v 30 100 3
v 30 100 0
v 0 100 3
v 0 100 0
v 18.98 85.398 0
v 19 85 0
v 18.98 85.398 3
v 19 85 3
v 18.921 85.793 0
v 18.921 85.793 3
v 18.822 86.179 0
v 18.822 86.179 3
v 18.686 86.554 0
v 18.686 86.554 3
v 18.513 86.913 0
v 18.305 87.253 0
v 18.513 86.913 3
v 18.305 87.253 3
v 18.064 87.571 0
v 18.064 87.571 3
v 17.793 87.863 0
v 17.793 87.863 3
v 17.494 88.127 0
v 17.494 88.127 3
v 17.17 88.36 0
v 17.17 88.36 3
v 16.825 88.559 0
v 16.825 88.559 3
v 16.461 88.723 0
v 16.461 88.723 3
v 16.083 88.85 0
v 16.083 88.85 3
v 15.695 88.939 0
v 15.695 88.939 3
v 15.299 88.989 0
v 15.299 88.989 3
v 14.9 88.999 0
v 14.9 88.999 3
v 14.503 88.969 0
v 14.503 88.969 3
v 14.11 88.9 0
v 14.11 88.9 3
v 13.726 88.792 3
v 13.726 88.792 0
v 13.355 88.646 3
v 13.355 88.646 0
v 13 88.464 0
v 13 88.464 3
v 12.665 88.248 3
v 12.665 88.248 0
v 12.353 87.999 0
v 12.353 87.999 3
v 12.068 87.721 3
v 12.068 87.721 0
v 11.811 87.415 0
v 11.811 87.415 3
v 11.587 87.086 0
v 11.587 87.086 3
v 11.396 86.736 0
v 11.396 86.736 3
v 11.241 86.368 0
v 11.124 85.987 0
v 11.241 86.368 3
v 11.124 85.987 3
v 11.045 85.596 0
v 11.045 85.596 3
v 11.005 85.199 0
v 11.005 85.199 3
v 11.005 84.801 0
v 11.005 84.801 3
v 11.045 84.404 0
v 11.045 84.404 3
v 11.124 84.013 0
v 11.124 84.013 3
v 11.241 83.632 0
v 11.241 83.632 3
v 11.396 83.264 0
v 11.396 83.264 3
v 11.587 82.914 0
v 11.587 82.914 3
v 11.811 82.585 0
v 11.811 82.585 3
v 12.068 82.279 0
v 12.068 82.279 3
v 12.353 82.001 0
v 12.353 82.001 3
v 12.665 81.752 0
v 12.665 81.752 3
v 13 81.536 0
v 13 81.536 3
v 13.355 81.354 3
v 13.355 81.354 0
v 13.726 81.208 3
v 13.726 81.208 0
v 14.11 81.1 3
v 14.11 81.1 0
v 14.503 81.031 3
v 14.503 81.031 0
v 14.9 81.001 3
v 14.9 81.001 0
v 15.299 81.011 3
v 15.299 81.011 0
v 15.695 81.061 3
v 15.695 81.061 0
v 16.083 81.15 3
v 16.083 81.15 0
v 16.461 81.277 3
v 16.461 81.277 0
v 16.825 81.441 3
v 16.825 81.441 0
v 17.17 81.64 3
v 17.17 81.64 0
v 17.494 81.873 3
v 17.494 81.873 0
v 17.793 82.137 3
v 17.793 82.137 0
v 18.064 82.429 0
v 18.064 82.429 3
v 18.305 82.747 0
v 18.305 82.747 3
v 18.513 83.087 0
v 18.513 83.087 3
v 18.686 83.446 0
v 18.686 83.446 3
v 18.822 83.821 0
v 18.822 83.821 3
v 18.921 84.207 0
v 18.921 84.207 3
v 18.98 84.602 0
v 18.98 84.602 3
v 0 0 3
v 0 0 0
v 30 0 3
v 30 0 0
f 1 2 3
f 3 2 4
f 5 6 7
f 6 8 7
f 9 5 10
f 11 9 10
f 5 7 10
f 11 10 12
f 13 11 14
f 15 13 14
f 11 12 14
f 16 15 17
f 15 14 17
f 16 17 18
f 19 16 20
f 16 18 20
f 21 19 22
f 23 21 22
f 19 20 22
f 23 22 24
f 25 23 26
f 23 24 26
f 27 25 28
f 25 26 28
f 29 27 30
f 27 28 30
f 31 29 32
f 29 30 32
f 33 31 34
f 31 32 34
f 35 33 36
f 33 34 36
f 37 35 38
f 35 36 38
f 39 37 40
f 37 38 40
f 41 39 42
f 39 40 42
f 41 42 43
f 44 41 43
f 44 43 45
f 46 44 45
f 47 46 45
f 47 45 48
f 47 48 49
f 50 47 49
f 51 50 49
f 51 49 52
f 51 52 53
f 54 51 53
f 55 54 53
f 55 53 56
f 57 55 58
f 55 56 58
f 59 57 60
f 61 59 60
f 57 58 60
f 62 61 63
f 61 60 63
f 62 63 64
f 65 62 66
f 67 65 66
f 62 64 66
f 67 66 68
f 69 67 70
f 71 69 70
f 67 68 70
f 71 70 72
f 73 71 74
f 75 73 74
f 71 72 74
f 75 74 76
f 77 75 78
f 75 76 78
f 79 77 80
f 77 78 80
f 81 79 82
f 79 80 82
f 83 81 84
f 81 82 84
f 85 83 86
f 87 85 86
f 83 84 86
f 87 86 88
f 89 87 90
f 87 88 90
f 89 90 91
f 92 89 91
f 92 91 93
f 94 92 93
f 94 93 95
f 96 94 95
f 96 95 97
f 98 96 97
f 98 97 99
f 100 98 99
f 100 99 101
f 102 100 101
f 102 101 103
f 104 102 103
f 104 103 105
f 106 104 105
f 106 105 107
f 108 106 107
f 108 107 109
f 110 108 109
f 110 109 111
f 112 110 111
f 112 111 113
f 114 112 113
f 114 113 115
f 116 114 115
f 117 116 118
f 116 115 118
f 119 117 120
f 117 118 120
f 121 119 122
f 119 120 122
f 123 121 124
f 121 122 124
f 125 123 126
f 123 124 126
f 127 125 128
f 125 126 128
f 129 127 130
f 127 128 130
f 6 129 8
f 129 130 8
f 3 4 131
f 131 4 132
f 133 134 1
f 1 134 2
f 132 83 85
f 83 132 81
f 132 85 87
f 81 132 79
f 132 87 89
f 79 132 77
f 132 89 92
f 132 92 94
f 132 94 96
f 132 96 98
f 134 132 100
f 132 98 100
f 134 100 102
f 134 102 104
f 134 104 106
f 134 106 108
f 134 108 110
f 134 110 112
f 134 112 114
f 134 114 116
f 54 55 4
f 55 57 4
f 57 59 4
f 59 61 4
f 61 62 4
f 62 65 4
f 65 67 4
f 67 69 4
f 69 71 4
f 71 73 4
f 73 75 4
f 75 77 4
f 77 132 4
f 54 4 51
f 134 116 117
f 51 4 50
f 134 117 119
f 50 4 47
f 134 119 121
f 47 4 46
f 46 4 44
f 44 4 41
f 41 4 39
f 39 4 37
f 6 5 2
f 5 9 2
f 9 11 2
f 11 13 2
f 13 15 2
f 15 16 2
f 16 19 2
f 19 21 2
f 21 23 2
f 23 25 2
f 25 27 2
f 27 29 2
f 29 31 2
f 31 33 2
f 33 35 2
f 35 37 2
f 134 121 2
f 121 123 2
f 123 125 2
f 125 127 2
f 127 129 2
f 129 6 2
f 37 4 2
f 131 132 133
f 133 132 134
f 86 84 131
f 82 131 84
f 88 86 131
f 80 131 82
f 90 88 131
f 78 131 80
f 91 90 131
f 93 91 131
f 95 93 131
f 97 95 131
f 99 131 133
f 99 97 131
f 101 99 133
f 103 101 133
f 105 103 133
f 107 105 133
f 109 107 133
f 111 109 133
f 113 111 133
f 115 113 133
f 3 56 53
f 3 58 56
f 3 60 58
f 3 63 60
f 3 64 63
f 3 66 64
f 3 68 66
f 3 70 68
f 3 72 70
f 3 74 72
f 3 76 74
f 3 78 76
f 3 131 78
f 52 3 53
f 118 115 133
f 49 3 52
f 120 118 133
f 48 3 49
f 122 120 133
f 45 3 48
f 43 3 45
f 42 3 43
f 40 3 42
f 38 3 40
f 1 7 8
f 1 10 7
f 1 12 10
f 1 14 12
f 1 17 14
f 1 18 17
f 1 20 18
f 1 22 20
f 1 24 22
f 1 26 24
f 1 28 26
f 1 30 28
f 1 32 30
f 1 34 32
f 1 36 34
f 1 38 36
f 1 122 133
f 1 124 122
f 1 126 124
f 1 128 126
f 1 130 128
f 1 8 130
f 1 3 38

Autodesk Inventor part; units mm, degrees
ref_plane "YZ Plane" through (0, 0, 0) normal (1, 0, 0) x (0, 1, 0)
ref_plane "XZ Plane" through (0, 0, 0) normal (0, 1, 0) x (-1, 0, 0)
ref_plane "XY Plane" through (0, 0, 0) normal (0, 0, 1) x (1, 0, 0)
sketch "Sketch1" plane through (0, 0, 0) normal (0, 0, 1) x (1, 0, 0)
  line L0 (0, 0) -> (30, 0)
  line L1 (30, 0) -> (30, 100)
  line L2 (30, 100) -> (0, 100)
  line L3 (0, 100) -> (0, 0)
  dimension "d0" = 30
  dimension "d1" = 100
extrude "Extrusion1" add sketch "Sketch1" along normal blind 3
sketch "Sketch2" plane through (0, 0, 3) normal (0, 0, 1) x (1, 0, 0)
  circle A0 centre (15, 85) radius 4
  line L0 (30, 0) -> (30, 100) projected
  line L1 (30, 100) -> (0, 100) projected
  point P0 (0, 0)
  dimension "d4" = 8
  dimension "d5" = 15
  dimension "d6" = 15
extrude "Extrusion2" cut sketch "Sketch2" against normal through all
properties part number "Chapa para sensor ultrassônico" material "Steel AISI 1006 85 HR"
